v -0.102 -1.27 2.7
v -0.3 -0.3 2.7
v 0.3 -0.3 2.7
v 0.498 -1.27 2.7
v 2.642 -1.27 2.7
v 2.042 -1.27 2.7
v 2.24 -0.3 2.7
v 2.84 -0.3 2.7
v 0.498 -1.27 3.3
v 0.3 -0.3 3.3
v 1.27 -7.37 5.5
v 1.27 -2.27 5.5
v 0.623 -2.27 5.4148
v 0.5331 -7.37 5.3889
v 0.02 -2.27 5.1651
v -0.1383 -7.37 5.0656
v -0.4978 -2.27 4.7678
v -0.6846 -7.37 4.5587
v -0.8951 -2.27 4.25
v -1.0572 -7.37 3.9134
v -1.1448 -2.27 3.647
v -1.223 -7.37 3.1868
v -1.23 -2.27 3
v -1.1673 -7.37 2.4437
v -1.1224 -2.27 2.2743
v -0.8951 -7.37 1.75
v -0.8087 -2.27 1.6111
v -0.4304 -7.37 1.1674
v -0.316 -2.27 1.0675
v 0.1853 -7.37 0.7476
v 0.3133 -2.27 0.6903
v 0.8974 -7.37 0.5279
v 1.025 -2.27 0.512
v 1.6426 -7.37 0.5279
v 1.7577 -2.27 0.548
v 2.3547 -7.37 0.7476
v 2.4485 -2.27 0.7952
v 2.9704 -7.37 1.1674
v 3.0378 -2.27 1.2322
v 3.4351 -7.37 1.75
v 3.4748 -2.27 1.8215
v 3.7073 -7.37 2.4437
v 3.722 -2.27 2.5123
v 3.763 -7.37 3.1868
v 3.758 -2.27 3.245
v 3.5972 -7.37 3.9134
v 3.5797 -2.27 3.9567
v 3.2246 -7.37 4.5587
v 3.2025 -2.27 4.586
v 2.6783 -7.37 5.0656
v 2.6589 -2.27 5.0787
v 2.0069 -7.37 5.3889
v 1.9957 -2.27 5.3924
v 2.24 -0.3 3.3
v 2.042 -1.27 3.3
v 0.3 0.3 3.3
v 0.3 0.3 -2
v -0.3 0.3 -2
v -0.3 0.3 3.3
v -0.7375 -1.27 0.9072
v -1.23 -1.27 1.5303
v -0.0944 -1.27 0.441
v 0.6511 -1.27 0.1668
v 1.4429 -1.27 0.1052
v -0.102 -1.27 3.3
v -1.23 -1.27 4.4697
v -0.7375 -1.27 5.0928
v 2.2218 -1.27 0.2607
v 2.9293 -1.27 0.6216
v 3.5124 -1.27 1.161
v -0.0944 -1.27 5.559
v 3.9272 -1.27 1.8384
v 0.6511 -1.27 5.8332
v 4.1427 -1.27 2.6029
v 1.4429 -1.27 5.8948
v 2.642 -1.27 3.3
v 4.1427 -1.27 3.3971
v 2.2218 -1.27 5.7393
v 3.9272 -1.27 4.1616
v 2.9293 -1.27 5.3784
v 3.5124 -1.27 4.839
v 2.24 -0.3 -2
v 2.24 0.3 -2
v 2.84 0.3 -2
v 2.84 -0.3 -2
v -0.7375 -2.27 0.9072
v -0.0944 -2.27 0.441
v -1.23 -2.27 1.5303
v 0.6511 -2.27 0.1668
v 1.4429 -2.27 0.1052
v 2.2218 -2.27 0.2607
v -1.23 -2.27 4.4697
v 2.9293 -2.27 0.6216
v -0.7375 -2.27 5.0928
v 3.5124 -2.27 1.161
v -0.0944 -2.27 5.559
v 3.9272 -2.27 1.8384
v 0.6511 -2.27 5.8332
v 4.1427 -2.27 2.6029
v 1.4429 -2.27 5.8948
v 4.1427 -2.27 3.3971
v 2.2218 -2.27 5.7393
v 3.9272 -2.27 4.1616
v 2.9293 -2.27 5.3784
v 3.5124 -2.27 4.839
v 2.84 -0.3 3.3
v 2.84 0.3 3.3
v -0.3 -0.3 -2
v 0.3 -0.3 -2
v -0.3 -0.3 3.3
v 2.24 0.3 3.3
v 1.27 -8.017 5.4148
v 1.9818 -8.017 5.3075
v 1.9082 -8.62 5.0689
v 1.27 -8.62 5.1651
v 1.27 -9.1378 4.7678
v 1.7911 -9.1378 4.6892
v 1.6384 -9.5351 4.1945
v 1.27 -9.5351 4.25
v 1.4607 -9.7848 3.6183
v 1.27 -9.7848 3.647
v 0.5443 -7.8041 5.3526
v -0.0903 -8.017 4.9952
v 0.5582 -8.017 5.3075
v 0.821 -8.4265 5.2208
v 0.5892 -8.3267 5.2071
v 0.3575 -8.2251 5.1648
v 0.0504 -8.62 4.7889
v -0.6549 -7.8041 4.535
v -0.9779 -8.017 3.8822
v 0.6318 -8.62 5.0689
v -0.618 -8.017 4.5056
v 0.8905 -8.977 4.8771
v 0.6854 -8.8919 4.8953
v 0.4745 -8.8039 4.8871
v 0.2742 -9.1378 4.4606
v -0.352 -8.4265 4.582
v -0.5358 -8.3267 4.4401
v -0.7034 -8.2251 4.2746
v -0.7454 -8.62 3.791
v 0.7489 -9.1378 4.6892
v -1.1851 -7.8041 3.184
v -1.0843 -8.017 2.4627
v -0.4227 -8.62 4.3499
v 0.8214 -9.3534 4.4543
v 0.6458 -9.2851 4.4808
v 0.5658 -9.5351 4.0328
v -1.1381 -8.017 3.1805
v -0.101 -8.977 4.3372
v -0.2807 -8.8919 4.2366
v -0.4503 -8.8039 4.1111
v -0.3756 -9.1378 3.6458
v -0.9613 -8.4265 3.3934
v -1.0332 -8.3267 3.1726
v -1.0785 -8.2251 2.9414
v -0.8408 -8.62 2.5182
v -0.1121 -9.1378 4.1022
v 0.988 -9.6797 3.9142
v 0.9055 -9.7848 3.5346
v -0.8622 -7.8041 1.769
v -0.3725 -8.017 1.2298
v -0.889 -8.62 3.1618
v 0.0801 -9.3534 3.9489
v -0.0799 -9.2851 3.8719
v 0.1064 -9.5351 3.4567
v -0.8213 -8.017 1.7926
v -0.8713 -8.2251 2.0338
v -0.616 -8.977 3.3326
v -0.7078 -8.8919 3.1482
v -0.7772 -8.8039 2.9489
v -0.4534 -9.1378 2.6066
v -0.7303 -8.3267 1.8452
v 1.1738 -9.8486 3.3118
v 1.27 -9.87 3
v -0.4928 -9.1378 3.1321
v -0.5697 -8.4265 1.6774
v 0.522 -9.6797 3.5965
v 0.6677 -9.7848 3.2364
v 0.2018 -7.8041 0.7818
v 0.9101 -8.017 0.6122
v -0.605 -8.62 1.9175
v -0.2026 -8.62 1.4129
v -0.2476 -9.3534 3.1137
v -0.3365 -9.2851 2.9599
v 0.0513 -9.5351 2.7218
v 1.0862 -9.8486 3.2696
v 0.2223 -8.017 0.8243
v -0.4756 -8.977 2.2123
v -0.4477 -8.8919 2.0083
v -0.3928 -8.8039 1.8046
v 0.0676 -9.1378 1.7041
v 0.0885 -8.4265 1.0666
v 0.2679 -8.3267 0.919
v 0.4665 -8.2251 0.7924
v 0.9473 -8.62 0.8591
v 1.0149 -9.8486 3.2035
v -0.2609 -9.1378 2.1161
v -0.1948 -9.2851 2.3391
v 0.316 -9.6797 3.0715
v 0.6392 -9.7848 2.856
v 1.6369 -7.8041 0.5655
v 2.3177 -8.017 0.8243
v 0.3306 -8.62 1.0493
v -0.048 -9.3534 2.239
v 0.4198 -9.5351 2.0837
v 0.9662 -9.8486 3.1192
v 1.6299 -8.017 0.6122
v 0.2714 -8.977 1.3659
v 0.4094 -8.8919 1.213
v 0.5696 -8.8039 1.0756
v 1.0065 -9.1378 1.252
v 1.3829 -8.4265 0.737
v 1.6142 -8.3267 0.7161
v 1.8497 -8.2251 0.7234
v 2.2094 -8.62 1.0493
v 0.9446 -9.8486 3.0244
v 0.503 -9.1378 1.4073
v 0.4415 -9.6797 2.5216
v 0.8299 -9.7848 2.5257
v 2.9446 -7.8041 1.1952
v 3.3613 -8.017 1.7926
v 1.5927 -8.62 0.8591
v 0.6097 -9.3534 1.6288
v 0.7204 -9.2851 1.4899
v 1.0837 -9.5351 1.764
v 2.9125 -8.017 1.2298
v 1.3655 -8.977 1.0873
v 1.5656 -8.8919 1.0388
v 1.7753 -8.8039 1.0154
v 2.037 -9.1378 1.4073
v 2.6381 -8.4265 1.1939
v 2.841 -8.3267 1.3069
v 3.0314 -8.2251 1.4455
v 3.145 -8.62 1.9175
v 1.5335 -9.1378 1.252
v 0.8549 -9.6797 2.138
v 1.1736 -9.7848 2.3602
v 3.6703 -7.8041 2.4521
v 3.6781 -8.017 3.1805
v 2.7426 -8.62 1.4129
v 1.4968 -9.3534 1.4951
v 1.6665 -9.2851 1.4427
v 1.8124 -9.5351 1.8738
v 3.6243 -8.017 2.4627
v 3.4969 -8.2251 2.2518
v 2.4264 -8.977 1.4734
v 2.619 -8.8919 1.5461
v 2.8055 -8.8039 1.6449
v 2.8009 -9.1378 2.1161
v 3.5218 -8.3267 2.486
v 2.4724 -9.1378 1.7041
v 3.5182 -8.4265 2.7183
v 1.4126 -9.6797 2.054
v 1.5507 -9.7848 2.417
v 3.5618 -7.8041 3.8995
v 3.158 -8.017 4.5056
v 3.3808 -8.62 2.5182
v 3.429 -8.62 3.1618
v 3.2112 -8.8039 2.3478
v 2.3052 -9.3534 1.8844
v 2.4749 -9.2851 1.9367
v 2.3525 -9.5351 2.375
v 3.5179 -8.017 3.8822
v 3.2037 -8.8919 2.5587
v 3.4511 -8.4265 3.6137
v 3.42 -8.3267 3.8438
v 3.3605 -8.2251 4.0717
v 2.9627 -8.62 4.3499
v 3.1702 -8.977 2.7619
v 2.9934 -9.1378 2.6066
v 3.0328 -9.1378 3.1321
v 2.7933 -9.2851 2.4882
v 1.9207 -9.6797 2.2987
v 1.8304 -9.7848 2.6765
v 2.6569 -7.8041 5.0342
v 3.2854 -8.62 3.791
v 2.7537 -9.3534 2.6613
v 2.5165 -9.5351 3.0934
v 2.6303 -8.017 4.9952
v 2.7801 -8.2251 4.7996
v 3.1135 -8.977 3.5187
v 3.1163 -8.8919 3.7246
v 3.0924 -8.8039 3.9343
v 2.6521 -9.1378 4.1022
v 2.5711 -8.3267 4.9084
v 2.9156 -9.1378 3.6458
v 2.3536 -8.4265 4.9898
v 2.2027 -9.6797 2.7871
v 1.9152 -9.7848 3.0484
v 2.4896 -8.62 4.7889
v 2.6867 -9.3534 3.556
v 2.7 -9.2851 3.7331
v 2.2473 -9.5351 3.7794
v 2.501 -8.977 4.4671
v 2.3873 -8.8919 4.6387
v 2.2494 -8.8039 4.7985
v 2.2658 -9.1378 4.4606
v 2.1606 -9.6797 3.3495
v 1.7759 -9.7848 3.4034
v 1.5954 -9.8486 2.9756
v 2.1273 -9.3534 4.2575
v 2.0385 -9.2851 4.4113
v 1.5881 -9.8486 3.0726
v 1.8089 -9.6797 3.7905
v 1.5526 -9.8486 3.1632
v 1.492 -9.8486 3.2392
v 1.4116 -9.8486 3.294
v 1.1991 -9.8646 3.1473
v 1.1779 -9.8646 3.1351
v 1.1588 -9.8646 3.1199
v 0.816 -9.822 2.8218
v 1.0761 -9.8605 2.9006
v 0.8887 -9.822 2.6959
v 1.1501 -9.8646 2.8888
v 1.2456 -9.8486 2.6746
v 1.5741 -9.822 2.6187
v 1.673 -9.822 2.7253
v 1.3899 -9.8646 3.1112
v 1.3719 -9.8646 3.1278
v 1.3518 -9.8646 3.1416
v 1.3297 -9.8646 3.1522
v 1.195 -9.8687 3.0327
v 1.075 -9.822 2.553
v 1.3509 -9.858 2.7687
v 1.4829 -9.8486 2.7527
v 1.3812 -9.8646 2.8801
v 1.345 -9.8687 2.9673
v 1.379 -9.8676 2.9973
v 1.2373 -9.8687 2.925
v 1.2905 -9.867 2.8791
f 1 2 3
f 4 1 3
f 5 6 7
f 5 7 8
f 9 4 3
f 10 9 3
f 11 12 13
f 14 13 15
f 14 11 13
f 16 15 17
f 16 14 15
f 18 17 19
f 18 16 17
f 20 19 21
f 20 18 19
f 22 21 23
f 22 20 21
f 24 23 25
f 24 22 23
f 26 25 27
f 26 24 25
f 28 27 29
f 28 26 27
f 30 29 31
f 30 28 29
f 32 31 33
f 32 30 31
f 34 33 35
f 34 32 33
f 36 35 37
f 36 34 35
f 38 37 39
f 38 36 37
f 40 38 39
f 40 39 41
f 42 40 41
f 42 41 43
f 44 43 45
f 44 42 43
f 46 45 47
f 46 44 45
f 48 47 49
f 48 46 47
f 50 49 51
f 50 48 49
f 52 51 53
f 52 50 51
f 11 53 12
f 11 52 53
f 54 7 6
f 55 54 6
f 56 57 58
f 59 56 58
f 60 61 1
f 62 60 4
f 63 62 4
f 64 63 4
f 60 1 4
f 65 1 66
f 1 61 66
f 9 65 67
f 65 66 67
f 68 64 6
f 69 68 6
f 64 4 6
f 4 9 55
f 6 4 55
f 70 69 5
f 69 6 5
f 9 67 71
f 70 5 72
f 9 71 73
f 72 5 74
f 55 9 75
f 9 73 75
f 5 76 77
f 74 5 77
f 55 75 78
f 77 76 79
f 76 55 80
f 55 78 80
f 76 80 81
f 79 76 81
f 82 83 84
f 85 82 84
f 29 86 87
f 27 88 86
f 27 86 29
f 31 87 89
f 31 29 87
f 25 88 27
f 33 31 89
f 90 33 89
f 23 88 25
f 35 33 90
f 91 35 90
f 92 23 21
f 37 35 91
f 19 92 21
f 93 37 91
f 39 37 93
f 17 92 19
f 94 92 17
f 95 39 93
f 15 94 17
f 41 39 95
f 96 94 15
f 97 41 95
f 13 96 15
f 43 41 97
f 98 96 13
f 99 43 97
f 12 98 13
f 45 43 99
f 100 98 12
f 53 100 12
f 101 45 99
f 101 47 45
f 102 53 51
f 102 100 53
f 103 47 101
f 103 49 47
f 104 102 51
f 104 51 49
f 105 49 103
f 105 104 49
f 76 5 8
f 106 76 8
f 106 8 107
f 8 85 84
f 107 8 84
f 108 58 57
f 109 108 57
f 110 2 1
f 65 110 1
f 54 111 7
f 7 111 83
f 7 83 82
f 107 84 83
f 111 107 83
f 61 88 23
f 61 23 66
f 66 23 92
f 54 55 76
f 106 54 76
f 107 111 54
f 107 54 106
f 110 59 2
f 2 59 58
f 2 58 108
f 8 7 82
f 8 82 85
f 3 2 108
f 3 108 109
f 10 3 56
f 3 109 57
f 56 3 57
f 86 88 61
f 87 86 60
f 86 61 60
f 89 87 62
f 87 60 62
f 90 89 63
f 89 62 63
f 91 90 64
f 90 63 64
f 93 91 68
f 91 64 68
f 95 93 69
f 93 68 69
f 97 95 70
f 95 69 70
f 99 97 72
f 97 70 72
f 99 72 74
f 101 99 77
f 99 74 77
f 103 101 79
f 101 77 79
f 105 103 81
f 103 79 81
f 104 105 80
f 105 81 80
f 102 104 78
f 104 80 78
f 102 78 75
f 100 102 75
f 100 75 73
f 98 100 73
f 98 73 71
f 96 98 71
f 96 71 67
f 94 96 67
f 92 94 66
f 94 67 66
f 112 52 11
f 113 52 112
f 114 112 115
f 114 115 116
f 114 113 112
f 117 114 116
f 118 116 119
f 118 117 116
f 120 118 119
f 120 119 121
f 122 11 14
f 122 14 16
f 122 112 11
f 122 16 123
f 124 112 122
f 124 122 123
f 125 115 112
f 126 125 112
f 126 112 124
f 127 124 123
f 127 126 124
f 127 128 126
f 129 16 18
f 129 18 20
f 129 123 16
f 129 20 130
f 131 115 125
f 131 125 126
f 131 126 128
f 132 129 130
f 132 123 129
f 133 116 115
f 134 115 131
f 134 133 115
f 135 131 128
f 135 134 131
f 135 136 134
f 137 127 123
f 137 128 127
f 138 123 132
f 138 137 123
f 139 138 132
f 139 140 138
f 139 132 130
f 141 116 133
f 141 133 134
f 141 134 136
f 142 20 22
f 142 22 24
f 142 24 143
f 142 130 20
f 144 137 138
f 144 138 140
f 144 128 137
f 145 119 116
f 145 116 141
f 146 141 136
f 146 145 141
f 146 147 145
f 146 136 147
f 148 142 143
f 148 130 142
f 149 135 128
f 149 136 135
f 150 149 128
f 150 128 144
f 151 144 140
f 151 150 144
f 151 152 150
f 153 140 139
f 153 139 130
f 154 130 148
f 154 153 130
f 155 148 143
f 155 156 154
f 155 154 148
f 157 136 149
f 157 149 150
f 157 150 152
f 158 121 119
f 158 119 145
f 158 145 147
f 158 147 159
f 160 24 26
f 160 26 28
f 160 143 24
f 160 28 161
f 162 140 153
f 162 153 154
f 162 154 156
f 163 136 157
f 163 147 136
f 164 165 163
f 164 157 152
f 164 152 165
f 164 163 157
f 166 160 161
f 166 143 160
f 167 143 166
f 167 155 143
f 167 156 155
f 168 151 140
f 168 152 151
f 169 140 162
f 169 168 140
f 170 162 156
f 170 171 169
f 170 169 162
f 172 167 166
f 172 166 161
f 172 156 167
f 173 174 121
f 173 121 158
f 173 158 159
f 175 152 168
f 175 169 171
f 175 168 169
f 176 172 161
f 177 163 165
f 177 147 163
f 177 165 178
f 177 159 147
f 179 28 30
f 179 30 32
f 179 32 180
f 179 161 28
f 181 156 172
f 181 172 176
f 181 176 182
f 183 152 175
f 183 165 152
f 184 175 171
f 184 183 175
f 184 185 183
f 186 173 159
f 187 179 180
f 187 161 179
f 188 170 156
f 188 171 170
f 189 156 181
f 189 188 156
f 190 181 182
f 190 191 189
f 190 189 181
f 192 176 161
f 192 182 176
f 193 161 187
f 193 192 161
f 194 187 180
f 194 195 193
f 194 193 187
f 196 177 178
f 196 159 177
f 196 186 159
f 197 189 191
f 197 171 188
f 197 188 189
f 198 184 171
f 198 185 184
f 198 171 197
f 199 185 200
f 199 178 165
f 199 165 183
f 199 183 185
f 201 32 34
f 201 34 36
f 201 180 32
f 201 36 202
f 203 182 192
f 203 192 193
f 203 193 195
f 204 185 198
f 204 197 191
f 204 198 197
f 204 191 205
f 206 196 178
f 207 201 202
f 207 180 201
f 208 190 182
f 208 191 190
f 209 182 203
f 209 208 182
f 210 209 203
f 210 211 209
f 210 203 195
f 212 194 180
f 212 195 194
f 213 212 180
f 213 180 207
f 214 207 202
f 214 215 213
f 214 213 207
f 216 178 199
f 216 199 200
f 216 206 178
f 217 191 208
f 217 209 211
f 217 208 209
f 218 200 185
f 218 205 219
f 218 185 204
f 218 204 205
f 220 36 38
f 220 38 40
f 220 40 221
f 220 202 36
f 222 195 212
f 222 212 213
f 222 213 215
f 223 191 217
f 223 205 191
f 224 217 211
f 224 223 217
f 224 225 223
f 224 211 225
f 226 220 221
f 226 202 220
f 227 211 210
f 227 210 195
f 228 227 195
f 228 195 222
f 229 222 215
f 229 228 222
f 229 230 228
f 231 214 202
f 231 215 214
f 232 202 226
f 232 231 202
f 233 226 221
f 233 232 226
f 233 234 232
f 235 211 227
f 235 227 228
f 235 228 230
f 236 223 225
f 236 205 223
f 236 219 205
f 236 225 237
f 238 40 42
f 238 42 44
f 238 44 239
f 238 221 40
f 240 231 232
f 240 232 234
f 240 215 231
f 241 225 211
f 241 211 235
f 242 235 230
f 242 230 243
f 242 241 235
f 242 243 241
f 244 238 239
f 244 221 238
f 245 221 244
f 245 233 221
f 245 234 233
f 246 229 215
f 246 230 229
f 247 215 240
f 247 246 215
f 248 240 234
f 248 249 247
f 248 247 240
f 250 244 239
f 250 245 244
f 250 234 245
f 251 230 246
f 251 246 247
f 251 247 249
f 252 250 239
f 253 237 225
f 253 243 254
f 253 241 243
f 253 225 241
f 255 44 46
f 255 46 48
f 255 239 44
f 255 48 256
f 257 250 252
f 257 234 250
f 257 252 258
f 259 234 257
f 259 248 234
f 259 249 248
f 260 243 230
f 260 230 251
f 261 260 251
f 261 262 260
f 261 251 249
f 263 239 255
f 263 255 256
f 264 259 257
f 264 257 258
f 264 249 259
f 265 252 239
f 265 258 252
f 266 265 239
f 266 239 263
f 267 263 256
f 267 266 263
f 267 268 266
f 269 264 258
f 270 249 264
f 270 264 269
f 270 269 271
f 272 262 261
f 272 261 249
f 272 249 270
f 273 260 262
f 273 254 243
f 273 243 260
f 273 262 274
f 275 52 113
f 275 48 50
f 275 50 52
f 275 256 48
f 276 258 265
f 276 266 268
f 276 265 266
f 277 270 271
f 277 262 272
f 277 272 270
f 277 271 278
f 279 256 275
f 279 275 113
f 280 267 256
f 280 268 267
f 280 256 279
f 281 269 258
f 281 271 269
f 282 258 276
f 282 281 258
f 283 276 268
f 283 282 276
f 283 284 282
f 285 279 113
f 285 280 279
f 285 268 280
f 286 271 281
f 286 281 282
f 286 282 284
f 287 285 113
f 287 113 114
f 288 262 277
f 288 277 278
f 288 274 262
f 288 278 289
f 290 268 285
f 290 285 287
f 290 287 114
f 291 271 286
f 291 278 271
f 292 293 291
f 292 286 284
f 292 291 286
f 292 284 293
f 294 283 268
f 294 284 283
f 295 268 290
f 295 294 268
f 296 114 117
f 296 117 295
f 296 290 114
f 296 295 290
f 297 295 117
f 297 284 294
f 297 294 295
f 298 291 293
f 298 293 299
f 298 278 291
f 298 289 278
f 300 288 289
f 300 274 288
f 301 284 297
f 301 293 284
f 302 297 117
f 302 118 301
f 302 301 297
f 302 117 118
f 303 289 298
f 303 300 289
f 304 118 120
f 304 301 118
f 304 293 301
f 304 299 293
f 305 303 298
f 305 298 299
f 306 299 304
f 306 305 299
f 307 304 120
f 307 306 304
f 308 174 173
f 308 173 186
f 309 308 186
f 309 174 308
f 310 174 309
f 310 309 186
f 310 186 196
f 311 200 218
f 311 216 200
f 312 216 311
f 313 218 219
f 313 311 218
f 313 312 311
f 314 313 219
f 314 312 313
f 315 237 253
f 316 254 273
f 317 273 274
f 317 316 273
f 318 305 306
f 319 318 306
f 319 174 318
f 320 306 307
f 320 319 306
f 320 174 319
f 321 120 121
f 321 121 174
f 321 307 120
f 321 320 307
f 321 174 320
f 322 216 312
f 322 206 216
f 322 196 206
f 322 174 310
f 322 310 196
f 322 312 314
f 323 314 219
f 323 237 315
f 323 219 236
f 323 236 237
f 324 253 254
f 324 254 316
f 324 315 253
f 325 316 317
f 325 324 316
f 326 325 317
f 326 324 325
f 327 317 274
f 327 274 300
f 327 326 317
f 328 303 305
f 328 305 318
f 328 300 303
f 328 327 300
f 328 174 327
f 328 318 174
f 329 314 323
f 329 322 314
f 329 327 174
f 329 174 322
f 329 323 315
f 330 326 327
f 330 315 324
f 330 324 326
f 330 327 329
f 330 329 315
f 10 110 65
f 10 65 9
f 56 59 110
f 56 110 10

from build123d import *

# Parameters (mm, degrees)
PAD001_DEPTH   = 0.6
SKETCH002_W    = 2.54
SKETCH002_H    = 0.6
PAD002_DEPTH   = 1
SKETCH004_R    = 2.9
SKETCH004_R_2  = 2.5
PAD003_DEPTH   = 1
SKETCH006_W    = 0.4
SKETCH006_H    = 5.8
POCKET_DEPTH   = 1.001
SKETCH_W       = 0.6
SKETCH_H       = 0.6
PAD_DEPTH      = 2.7
PAD_DEPTH_BACK = 2


with BuildPart() as pad001:
    # Sketch001 → Pad001 (new body)
    with BuildSketch(Plane.XY.offset(2.7)):
        Polygon((0.3, 0.3), (-0.3, 0.3), (-0.3, -0.3), (0, -1.77), (0.6, -1.77), (0.3, -0.3), align=None)
        Polygon((2.84, 0.3), (2.24, 0.3), (2.24, -0.3), (1.94, -1.77), (2.54, -1.77), (2.84, -0.3), align=None)
    extrude(amount=PAD001_DEPTH)


with BuildPart() as pad002:
    # Sketch002 → Pad002 (new body)
    with BuildSketch(Plane.XZ.offset(1.77)):
        with Locations((1.27, 3)):
            Rectangle(SKETCH002_W, SKETCH002_H)
    extrude(amount=PAD002_DEPTH)


with BuildPart() as revolution:
    # Sketch003 → Revolution (revolve)
    with BuildSketch(Plane.YZ.offset(1.27)):
        with BuildLine():
            Line((-1.27, 3), (-9.87, 3))
            ThreePointArc((-7.37, 5.5), (-9.137767, 4.767767), (-9.87, 3))
            Line((-1.27, 5.5), (-7.37, 5.5))
            Line((-1.27, 3), (-1.27, 5.5))
        make_face()
    revolve(axis=Axis((1.27, -5.810397, 3), (0, -1, 0)))


with BuildPart() as revolution001:
    # Sketch005 → Revolution001 (revolve)
    with BuildSketch(Plane.YZ.offset(1.27)):
        Polygon((-2.47, 3), (-2.97, 3), (-2.97, 3.5), align=None)
    revolve(axis=Axis((1.27, -3.977201, 3), (0, -1, 0)))


with BuildPart() as pocket:
    # Sketch004 → Pad003 (new body)
    with BuildSketch(Plane.XZ.offset(1.27)):
        with Locations((1.27, 3)):
            Circle(SKETCH004_R)
        with Locations((1.27, 3)):
            Circle(SKETCH004_R_2, mode=Mode.SUBTRACT)
    extrude(amount=PAD003_DEPTH)

    # Sketch006 → Pocket (cut, through all)
    with BuildSketch(Plane.XZ.offset(2.27)):
        with Locations((-1.43, 3)):
            Rectangle(SKETCH006_W, SKETCH006_H)
    extrude(amount=-POCKET_DEPTH, mode=Mode.SUBTRACT)


with BuildPart() as pad_mp_cp:
    # Sketch → Pad (new body, two sides)
    with BuildSketch(Plane.XY) as pad_sk:
        Rectangle(SKETCH_W, SKETCH_H)
        with Locations((2.54, 0)):
            Rectangle(SKETCH_W, SKETCH_H)
    extrude(amount=PAD_DEPTH)
    extrude(pad_sk.sketch, amount=-PAD_DEPTH_BACK)

    # Pad_mp_cp: union Pad001, Pad002, Revolution, Revolution001, Pocket
    add(pad001.part)
    add(pad002.part)
    add(revolution.part)
    add(revolution001.part)
    add(pocket.part)


solid = pad_mp_cp.part
